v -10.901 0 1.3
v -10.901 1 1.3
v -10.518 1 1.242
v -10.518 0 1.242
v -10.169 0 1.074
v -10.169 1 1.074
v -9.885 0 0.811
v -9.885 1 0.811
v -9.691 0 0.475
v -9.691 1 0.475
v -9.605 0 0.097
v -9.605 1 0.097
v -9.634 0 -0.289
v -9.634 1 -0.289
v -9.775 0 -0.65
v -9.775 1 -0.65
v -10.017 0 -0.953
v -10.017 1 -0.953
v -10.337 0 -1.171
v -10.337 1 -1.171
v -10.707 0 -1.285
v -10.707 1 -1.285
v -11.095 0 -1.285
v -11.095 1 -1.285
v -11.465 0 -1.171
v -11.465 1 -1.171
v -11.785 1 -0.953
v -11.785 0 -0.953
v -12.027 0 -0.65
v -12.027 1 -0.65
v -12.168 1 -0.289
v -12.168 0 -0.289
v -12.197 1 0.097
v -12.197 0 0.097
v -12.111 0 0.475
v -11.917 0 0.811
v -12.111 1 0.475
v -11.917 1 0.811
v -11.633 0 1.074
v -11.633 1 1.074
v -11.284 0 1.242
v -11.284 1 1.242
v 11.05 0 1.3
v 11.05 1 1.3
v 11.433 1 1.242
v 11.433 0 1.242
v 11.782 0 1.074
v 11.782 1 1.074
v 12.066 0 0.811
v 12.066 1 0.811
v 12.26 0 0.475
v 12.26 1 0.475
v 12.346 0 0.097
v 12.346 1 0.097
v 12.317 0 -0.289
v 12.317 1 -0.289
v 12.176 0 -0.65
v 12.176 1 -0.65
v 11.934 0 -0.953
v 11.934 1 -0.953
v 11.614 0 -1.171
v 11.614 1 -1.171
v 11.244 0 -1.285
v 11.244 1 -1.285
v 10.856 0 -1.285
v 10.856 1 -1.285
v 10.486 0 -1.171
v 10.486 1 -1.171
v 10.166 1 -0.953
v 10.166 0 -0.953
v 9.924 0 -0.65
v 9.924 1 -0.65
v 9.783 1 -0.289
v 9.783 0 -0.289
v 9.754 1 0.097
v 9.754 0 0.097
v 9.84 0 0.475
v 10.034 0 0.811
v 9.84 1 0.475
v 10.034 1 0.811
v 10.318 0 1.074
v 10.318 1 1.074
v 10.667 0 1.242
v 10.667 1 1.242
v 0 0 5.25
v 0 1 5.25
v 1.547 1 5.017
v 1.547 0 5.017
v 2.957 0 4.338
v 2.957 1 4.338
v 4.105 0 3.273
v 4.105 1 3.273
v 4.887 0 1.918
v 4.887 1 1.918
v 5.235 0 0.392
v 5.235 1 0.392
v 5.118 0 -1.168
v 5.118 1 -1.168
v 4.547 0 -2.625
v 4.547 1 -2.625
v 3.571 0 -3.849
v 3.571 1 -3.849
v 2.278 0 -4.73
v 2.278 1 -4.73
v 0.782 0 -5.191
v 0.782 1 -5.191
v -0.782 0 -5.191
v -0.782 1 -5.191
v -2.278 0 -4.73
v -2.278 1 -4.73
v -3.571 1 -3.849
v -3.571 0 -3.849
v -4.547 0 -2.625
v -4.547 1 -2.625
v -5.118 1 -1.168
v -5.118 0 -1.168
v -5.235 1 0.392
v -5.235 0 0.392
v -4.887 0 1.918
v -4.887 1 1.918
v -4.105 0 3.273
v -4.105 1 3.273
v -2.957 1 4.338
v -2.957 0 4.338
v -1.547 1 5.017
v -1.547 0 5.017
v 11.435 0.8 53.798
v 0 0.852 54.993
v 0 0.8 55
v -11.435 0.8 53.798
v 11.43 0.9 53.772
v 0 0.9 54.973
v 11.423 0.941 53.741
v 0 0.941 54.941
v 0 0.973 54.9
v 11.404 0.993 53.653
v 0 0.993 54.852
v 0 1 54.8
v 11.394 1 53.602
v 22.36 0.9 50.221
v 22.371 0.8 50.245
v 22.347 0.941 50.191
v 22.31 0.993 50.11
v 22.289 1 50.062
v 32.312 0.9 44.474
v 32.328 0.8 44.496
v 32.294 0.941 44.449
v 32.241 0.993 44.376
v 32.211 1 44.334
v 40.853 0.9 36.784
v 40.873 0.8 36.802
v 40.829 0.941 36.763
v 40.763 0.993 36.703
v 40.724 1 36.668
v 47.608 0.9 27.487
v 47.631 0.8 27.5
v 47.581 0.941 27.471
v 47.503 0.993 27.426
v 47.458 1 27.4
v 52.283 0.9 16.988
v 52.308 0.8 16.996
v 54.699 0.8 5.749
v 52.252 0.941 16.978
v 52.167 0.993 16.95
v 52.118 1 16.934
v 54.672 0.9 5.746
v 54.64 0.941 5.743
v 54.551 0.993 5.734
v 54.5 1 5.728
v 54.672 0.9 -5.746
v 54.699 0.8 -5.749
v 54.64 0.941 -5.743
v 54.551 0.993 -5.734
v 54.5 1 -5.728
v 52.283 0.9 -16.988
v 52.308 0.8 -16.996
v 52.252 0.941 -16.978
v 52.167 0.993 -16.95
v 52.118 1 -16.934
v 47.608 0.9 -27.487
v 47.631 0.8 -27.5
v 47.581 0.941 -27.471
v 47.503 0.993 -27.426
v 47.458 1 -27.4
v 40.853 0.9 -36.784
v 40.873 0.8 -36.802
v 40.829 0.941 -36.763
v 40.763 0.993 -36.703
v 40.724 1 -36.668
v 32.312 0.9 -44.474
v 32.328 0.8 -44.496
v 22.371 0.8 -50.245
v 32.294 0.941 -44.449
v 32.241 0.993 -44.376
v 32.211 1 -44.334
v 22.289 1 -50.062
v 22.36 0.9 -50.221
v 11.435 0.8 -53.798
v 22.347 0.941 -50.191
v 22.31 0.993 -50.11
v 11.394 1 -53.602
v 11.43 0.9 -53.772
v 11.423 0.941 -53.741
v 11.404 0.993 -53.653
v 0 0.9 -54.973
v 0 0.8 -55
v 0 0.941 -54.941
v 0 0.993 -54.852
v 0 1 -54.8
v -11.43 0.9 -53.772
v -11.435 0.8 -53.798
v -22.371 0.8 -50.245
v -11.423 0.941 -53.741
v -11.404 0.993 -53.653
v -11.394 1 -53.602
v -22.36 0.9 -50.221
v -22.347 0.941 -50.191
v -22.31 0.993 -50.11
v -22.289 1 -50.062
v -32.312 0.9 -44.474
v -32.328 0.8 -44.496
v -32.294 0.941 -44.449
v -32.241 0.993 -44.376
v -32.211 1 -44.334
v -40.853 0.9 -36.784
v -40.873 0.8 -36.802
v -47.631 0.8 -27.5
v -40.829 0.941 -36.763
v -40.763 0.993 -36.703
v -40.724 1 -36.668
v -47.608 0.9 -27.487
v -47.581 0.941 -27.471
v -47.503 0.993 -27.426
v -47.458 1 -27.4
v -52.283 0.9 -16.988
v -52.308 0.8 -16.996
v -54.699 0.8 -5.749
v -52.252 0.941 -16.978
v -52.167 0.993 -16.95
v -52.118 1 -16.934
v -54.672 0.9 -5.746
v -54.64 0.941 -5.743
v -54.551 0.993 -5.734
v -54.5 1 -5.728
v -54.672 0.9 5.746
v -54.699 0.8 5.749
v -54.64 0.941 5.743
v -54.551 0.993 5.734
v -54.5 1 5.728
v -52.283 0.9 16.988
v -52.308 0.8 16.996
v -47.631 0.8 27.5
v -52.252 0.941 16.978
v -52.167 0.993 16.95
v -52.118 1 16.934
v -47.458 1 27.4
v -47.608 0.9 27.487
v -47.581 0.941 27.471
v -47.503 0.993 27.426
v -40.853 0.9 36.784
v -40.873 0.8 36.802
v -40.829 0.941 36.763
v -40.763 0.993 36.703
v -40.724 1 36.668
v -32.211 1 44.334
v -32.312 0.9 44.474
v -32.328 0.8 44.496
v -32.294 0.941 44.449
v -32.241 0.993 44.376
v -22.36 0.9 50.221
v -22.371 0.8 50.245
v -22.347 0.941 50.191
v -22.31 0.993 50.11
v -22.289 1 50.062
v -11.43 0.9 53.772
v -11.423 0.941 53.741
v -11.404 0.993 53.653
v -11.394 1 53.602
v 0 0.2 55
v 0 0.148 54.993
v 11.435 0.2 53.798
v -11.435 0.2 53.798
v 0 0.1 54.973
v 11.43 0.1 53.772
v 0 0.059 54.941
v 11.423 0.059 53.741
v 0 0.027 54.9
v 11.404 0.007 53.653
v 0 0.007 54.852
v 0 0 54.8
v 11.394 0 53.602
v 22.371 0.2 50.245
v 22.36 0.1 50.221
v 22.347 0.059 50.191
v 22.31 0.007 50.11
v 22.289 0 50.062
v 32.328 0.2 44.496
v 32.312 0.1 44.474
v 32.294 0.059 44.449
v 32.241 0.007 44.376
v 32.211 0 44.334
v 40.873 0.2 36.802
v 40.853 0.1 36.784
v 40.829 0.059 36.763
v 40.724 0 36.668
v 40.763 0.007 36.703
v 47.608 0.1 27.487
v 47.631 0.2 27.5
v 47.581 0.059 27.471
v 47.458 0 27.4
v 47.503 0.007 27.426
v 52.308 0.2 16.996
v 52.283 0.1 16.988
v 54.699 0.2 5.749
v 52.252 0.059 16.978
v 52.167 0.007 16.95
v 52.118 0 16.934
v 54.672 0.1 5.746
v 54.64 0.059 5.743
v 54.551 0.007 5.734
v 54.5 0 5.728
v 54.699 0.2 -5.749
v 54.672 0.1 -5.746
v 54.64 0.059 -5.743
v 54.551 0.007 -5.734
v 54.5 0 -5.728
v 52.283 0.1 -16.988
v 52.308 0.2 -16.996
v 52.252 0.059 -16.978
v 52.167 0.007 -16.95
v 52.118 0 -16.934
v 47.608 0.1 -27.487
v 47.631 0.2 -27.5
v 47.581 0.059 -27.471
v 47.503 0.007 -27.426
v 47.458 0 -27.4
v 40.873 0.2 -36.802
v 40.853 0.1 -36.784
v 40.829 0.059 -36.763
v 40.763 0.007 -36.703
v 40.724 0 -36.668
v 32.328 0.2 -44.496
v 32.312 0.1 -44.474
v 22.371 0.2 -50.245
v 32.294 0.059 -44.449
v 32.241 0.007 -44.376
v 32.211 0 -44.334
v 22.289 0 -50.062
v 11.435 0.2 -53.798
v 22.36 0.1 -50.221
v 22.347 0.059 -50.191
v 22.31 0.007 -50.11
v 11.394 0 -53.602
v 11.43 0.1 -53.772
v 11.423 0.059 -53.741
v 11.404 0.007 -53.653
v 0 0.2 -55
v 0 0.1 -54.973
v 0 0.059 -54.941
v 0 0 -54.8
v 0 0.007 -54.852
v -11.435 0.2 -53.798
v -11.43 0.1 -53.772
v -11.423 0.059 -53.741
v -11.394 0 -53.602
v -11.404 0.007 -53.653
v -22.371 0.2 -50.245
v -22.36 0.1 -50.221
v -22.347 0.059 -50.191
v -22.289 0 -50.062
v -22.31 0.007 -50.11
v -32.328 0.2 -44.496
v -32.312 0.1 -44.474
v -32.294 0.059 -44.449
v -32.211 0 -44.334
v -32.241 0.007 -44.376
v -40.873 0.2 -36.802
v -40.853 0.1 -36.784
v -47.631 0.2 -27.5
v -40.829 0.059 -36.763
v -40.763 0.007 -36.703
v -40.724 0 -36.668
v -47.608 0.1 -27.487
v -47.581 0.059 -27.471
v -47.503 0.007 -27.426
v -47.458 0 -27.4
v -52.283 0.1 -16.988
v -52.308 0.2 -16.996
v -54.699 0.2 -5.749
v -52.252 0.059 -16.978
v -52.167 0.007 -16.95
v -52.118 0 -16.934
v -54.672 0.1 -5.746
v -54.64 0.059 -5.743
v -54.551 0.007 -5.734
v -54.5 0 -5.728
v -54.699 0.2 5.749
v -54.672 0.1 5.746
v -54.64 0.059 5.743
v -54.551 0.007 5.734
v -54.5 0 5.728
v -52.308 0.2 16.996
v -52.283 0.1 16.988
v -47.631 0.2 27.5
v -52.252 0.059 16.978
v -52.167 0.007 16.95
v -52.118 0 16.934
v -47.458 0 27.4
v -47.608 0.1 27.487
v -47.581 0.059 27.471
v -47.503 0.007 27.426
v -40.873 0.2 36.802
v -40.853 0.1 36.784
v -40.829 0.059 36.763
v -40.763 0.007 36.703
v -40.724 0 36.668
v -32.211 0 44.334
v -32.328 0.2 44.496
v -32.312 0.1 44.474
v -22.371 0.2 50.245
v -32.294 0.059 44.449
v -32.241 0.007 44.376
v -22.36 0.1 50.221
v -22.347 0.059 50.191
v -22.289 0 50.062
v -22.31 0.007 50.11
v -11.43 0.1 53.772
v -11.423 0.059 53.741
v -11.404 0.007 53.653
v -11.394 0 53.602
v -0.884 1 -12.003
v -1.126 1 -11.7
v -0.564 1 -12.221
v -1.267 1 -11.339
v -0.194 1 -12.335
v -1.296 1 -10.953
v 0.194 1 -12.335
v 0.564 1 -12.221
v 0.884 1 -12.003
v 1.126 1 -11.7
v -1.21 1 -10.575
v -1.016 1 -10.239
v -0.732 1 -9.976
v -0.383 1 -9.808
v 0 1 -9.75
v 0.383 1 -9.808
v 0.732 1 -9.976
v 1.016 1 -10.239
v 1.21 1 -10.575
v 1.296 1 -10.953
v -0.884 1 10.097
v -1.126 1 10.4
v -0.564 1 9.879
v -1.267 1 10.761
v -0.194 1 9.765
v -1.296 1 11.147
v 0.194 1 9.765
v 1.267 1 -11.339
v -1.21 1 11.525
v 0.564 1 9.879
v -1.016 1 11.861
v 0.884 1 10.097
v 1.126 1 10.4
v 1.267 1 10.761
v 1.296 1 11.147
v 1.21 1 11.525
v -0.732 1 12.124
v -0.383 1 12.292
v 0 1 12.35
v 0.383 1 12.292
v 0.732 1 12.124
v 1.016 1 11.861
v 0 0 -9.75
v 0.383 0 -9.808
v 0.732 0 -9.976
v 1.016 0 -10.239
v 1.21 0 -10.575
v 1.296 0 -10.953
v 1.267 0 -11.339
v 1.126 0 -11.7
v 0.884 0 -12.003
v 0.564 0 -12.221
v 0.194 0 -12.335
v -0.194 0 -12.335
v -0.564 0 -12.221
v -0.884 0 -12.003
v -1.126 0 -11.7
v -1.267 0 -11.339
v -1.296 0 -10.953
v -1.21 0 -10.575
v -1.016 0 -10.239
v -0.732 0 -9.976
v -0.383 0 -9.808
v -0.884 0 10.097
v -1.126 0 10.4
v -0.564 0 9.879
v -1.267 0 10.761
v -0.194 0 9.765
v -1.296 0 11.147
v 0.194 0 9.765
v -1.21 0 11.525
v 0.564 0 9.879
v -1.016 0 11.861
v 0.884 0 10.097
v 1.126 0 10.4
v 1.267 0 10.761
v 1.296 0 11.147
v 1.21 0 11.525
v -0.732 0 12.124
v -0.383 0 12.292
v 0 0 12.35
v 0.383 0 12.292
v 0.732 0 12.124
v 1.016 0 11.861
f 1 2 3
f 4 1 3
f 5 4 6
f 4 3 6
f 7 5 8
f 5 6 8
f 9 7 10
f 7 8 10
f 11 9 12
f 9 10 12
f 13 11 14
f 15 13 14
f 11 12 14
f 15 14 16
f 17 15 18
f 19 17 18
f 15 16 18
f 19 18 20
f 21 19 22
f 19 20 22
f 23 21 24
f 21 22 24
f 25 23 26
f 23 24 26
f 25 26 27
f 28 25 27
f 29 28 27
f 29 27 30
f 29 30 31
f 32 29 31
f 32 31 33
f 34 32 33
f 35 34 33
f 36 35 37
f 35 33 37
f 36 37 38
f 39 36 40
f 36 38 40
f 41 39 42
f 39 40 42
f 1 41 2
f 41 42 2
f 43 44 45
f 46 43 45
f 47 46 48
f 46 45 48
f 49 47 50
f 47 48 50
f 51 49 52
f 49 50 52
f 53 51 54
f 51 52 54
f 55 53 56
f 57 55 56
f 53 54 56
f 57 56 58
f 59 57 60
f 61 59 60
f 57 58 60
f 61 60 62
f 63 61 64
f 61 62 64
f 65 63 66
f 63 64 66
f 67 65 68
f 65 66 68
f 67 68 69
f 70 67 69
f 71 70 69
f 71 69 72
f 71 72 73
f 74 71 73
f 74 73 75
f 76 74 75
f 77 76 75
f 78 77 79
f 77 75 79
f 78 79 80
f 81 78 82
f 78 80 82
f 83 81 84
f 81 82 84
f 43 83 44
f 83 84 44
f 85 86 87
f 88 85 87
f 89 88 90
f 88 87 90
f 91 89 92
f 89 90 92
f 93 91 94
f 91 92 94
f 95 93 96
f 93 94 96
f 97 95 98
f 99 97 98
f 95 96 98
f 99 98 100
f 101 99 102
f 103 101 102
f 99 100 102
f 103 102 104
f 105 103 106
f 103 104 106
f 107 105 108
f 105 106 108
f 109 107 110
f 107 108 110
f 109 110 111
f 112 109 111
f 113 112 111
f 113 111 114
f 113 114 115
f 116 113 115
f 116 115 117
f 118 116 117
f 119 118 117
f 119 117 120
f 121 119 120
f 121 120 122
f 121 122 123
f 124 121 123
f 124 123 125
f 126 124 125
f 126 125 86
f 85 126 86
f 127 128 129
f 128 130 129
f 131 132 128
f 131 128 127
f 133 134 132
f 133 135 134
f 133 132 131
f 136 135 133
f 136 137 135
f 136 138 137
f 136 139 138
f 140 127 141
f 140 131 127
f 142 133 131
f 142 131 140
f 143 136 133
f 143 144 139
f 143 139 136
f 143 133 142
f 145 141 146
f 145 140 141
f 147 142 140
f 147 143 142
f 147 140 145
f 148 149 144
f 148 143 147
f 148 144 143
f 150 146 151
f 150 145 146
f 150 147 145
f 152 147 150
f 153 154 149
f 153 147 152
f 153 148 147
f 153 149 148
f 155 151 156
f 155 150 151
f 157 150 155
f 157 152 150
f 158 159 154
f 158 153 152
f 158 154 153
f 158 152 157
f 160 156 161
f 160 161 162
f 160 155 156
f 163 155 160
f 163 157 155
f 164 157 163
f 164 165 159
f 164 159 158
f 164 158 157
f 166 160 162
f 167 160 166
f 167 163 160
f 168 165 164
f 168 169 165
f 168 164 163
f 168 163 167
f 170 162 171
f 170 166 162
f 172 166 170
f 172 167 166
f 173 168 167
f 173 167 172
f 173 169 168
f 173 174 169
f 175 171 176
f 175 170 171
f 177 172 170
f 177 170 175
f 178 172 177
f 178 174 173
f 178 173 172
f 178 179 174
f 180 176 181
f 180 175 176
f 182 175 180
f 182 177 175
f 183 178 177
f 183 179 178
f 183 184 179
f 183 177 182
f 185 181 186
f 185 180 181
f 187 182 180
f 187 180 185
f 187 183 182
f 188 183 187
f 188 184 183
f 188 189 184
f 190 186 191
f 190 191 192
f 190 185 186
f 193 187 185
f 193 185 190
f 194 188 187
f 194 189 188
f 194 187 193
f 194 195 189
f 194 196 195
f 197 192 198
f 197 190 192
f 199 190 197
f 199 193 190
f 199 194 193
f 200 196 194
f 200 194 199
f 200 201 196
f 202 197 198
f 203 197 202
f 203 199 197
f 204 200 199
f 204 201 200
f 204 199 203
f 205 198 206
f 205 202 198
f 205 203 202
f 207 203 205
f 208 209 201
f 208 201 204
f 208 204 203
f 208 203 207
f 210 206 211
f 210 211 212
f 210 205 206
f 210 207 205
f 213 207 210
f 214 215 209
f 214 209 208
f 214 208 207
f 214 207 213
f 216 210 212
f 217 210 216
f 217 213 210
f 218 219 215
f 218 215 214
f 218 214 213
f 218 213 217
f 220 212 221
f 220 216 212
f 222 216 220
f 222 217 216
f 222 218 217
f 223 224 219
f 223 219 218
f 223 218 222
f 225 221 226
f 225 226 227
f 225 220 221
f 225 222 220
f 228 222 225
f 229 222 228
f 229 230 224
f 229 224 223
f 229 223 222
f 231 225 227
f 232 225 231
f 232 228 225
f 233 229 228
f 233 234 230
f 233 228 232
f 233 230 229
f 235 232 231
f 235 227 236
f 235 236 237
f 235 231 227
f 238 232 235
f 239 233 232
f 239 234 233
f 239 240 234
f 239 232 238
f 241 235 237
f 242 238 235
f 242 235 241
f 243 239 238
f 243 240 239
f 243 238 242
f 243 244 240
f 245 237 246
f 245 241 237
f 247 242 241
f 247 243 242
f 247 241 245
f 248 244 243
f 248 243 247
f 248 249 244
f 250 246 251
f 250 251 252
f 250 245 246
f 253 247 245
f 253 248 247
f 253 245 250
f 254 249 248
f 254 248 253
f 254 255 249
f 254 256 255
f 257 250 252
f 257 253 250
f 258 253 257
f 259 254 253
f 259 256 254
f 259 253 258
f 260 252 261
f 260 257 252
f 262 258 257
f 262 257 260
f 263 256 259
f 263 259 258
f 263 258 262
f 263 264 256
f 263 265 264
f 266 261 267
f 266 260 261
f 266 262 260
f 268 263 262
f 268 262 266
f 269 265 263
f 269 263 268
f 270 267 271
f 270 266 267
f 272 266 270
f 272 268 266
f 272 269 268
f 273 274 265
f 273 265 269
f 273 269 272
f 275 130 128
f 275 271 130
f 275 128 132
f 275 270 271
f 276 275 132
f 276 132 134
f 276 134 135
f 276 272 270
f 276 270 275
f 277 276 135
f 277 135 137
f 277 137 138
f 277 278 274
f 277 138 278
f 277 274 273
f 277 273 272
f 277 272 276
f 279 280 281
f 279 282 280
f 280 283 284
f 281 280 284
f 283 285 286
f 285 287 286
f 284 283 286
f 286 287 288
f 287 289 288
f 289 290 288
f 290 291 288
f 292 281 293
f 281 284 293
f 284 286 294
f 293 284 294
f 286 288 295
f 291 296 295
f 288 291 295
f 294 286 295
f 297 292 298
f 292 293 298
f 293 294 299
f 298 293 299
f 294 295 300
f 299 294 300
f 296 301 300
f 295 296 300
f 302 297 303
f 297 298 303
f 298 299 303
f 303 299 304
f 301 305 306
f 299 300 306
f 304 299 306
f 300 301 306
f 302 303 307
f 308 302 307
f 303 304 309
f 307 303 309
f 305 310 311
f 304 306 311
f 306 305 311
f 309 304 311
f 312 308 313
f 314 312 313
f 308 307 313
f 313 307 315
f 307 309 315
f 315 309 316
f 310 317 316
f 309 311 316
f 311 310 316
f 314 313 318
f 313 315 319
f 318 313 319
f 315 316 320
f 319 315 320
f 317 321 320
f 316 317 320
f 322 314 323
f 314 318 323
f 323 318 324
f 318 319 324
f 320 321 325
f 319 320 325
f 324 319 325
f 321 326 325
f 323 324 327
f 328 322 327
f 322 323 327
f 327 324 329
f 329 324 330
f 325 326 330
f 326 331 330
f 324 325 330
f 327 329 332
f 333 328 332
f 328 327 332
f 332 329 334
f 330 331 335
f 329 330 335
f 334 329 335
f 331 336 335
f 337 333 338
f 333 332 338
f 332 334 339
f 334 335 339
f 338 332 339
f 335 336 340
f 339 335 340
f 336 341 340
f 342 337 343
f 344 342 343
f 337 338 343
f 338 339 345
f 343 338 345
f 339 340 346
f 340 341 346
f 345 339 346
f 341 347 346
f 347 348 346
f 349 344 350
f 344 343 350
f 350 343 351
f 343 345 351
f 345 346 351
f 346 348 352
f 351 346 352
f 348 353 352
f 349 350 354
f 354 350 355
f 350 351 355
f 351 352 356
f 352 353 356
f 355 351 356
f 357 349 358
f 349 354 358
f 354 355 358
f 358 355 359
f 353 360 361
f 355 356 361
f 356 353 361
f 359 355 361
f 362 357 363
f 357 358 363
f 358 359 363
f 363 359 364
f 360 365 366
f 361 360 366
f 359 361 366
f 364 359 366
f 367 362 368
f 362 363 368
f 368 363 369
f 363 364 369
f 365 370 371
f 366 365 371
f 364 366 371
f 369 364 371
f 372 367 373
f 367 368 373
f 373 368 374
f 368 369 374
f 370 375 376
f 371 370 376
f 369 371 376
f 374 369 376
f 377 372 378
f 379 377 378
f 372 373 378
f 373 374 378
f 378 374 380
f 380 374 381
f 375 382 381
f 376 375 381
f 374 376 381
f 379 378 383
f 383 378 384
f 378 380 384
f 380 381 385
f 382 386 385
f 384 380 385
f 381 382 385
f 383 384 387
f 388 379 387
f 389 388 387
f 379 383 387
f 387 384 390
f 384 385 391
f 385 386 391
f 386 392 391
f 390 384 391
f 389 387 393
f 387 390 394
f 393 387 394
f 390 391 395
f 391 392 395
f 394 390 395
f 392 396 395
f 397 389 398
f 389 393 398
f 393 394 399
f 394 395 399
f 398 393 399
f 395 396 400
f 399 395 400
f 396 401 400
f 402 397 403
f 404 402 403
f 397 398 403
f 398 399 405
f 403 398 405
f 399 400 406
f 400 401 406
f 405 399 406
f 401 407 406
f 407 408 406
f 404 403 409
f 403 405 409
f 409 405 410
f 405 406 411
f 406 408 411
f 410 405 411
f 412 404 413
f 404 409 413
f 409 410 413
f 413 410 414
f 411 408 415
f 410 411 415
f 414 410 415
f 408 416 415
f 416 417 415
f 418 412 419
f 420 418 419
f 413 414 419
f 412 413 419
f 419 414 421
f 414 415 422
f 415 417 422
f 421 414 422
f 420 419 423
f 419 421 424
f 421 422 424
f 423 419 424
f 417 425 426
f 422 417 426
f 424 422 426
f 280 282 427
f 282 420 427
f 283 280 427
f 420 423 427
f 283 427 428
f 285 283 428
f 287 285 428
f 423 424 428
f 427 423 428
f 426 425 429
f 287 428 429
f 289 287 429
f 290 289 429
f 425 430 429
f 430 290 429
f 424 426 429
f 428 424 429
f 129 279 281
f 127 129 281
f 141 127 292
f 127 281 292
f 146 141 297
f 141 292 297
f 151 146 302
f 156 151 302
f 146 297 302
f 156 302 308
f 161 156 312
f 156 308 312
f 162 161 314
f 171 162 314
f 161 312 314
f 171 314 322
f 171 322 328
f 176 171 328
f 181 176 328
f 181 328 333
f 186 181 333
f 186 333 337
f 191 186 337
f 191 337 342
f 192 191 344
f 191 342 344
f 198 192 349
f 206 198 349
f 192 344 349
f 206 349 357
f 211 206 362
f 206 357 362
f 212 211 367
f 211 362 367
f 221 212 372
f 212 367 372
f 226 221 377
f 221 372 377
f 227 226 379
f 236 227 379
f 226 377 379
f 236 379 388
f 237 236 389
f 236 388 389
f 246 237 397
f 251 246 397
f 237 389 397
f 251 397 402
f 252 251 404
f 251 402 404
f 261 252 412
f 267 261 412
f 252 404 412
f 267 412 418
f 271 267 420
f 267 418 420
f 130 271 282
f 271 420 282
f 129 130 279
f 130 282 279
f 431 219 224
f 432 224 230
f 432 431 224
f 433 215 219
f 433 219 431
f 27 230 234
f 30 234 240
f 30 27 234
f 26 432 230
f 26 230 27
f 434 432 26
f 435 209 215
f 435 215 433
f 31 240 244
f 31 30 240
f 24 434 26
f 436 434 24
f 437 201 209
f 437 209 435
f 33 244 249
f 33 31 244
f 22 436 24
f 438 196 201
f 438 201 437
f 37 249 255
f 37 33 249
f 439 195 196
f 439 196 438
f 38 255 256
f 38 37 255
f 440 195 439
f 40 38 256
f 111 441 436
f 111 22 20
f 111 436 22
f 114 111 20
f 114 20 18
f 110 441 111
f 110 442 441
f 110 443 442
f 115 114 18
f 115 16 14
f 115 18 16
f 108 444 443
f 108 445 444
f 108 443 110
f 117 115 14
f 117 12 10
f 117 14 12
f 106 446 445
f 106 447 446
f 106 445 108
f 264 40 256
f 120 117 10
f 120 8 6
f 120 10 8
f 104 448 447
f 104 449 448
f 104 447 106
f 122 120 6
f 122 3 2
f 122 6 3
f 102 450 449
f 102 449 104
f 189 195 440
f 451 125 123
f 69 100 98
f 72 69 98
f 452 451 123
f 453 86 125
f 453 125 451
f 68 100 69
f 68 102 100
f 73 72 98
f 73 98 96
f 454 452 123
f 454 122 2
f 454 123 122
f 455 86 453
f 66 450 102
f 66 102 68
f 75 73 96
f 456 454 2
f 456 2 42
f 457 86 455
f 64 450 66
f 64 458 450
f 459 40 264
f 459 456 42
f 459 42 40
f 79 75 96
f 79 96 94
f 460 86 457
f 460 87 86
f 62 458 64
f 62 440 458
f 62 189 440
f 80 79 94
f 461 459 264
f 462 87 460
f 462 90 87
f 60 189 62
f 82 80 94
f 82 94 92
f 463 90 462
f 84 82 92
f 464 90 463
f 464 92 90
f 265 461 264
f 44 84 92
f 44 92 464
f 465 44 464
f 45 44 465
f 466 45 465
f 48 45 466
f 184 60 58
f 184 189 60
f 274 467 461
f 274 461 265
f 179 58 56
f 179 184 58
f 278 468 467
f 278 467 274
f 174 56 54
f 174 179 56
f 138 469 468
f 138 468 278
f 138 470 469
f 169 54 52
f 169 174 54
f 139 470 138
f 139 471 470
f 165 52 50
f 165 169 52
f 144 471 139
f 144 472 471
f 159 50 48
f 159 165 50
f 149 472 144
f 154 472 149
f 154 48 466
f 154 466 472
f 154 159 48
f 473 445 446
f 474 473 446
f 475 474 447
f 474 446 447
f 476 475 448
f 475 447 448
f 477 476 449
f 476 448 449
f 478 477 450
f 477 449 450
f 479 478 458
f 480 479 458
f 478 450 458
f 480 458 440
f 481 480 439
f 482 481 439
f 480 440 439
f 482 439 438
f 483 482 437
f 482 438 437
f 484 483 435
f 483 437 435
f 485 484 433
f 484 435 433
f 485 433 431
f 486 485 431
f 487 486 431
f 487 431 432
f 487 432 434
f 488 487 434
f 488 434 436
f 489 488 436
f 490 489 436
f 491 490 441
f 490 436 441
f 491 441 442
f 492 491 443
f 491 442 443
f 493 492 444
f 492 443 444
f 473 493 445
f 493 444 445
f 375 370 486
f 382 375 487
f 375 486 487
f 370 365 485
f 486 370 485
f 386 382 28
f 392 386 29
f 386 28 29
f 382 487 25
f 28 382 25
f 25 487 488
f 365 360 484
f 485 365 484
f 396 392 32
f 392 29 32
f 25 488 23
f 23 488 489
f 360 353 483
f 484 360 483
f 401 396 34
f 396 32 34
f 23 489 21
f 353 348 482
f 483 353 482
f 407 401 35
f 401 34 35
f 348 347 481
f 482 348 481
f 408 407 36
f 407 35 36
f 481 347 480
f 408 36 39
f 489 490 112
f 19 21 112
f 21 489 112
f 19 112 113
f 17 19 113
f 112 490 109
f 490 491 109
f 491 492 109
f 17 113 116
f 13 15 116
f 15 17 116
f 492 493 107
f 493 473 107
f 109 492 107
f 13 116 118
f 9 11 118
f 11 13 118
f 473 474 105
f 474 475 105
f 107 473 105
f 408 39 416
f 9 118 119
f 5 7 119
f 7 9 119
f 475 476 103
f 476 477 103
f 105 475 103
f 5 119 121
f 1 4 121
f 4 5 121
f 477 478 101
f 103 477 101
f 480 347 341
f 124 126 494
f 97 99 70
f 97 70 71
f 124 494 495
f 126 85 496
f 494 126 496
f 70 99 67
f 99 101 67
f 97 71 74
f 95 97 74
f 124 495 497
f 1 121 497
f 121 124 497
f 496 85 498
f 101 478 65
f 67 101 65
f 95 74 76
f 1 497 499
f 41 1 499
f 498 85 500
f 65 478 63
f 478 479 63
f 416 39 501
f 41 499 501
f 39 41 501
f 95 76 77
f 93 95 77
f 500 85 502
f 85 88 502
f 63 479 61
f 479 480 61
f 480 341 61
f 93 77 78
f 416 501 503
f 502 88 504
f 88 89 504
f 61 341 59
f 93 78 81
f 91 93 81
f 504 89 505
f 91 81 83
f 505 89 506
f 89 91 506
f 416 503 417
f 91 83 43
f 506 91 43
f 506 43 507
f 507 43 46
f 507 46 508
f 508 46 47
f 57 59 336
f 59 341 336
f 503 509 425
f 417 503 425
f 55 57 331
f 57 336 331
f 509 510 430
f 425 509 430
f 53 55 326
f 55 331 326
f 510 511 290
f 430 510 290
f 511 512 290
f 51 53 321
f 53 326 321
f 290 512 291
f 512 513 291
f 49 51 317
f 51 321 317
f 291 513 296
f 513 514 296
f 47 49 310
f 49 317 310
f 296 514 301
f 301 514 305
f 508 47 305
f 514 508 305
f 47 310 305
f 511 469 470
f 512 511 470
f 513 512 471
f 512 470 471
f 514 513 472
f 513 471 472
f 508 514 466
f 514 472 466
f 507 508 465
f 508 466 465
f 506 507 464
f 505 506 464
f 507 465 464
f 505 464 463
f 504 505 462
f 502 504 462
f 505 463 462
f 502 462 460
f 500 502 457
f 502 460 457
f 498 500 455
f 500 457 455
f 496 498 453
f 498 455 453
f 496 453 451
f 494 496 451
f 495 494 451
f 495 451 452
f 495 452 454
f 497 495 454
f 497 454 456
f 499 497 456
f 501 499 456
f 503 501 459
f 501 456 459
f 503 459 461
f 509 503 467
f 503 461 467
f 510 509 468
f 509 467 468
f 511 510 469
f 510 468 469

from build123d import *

# Parameters (mm, degrees)
SKETCH1_R           = 55
BOSS_EXTRUDE1_DEPTH = 1
FILLET2_R           = 0.2
SKETCH4_R           = 5.25
CUT_EXTRUDE2_DEPTH  = 78.78817405
SKETCH5_R           = 1.3
CUT_EXTRUDE3_DEPTH  = 1


with BuildPart() as part:
    # Sketch1 → Boss-Extrude1 (new body)
    with BuildSketch(Plane(origin=(0, 0, 0), x_dir=(1, 0, 0), z_dir=(0, 1, 0))):
        with Locations(Location((0, 0, 0), (0, 0, 270))):
            Circle(SKETCH1_R)
    extrude(amount=BOSS_EXTRUDE1_DEPTH)

    # Fillet2
    fillet2_edges = [part.edges().sort_by_distance(p)[0] for p in [
        (0, 0, -55),
        (0, 1, -55),
    ]]
    fillet(fillet2_edges, radius=FILLET2_R)

    # Sketch4 → Cut-Extrude2 (cut, through all)
    with BuildSketch(Plane(origin=(0, 1, 0), x_dir=(1, 0, 0), z_dir=(0, 1, 0))):
        with Locations(Location((0, 0, 0), (0, 0, 270))):
            Circle(SKETCH4_R)
    extrude(amount=-CUT_EXTRUDE2_DEPTH, mode=Mode.SUBTRACT)

    # Sketch5 → Cut-Extrude3 (cut)
    with BuildSketch(Plane(origin=(0, 1, 0), x_dir=(1, 0, 0), z_dir=(0, 1, 0))):
        with Locations(Location((-10.900916731, 0, 0), (0, 0, 270))):
            Circle(SKETCH5_R)
        with Locations(Location((0, 11.05, 0), (0, 0, 270))):
            Circle(SKETCH5_R)
        with Locations(Location((11.05, 0, 0), (0, 0, 270))):
            Circle(SKETCH5_R)
        with Locations(Location((0, -11.05, 0), (0, 0, 270))):
            Circle(SKETCH5_R)
    extrude(amount=-CUT_EXTRUDE3_DEPTH, mode=Mode.SUBTRACT)


solid = part.part
